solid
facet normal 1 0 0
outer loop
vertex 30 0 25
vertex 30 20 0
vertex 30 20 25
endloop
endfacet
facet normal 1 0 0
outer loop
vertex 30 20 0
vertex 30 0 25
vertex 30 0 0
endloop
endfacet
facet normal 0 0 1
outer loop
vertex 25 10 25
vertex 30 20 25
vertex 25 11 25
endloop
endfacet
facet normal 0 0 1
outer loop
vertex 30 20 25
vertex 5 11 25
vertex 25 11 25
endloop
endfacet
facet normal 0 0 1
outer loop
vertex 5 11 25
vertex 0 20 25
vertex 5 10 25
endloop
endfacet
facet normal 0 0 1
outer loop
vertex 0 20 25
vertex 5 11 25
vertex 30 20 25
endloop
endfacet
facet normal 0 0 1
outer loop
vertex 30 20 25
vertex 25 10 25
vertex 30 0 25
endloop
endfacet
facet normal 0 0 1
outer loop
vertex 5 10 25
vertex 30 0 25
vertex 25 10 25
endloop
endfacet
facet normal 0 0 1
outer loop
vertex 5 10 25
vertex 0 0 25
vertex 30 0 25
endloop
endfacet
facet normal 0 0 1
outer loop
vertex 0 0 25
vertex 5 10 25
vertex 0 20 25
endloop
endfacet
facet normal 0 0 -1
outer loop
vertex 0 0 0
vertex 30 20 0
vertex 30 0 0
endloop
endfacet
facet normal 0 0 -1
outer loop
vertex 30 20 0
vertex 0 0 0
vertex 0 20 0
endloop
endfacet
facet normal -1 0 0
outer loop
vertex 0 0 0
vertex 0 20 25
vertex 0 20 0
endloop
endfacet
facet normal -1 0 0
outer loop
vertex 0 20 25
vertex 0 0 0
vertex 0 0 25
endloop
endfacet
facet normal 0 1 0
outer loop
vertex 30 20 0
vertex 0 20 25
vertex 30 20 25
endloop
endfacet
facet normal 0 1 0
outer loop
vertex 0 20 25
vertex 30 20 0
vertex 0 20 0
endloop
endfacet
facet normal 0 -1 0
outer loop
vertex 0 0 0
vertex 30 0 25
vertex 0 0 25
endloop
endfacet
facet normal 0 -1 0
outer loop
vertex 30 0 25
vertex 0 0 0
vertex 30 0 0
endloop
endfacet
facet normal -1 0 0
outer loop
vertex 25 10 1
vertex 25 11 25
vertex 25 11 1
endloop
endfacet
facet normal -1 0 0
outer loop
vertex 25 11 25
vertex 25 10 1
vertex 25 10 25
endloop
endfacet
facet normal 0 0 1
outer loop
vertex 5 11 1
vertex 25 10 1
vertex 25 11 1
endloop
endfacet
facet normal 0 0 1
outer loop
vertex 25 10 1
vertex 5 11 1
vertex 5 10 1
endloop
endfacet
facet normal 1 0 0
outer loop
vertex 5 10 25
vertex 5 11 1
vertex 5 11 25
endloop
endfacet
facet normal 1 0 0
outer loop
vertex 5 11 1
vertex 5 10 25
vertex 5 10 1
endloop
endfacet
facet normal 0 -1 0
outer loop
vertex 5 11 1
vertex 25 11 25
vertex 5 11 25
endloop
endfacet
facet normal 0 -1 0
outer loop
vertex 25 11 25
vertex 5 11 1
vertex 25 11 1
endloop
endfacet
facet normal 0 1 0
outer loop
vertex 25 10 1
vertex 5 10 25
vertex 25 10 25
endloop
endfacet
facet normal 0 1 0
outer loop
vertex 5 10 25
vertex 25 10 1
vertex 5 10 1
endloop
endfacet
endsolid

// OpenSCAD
difference()
{
  cube([30,20,25]);
  translate([5,10,1]) cube([20,1,30]);
}
*translate([15,0,17]) rotate([90,0,0])
linear_extrude(height=0.5, convexity=2) 
text("H=25 mm",4, font="Tahoma", halign="center", valign="center");
*translate([15,0,9]) rotate([90,0,0])
linear_extrude(height=0.5, convexity=2) 
text("W=30 mm",4, font="Tahoma", halign="center", valign="center");
